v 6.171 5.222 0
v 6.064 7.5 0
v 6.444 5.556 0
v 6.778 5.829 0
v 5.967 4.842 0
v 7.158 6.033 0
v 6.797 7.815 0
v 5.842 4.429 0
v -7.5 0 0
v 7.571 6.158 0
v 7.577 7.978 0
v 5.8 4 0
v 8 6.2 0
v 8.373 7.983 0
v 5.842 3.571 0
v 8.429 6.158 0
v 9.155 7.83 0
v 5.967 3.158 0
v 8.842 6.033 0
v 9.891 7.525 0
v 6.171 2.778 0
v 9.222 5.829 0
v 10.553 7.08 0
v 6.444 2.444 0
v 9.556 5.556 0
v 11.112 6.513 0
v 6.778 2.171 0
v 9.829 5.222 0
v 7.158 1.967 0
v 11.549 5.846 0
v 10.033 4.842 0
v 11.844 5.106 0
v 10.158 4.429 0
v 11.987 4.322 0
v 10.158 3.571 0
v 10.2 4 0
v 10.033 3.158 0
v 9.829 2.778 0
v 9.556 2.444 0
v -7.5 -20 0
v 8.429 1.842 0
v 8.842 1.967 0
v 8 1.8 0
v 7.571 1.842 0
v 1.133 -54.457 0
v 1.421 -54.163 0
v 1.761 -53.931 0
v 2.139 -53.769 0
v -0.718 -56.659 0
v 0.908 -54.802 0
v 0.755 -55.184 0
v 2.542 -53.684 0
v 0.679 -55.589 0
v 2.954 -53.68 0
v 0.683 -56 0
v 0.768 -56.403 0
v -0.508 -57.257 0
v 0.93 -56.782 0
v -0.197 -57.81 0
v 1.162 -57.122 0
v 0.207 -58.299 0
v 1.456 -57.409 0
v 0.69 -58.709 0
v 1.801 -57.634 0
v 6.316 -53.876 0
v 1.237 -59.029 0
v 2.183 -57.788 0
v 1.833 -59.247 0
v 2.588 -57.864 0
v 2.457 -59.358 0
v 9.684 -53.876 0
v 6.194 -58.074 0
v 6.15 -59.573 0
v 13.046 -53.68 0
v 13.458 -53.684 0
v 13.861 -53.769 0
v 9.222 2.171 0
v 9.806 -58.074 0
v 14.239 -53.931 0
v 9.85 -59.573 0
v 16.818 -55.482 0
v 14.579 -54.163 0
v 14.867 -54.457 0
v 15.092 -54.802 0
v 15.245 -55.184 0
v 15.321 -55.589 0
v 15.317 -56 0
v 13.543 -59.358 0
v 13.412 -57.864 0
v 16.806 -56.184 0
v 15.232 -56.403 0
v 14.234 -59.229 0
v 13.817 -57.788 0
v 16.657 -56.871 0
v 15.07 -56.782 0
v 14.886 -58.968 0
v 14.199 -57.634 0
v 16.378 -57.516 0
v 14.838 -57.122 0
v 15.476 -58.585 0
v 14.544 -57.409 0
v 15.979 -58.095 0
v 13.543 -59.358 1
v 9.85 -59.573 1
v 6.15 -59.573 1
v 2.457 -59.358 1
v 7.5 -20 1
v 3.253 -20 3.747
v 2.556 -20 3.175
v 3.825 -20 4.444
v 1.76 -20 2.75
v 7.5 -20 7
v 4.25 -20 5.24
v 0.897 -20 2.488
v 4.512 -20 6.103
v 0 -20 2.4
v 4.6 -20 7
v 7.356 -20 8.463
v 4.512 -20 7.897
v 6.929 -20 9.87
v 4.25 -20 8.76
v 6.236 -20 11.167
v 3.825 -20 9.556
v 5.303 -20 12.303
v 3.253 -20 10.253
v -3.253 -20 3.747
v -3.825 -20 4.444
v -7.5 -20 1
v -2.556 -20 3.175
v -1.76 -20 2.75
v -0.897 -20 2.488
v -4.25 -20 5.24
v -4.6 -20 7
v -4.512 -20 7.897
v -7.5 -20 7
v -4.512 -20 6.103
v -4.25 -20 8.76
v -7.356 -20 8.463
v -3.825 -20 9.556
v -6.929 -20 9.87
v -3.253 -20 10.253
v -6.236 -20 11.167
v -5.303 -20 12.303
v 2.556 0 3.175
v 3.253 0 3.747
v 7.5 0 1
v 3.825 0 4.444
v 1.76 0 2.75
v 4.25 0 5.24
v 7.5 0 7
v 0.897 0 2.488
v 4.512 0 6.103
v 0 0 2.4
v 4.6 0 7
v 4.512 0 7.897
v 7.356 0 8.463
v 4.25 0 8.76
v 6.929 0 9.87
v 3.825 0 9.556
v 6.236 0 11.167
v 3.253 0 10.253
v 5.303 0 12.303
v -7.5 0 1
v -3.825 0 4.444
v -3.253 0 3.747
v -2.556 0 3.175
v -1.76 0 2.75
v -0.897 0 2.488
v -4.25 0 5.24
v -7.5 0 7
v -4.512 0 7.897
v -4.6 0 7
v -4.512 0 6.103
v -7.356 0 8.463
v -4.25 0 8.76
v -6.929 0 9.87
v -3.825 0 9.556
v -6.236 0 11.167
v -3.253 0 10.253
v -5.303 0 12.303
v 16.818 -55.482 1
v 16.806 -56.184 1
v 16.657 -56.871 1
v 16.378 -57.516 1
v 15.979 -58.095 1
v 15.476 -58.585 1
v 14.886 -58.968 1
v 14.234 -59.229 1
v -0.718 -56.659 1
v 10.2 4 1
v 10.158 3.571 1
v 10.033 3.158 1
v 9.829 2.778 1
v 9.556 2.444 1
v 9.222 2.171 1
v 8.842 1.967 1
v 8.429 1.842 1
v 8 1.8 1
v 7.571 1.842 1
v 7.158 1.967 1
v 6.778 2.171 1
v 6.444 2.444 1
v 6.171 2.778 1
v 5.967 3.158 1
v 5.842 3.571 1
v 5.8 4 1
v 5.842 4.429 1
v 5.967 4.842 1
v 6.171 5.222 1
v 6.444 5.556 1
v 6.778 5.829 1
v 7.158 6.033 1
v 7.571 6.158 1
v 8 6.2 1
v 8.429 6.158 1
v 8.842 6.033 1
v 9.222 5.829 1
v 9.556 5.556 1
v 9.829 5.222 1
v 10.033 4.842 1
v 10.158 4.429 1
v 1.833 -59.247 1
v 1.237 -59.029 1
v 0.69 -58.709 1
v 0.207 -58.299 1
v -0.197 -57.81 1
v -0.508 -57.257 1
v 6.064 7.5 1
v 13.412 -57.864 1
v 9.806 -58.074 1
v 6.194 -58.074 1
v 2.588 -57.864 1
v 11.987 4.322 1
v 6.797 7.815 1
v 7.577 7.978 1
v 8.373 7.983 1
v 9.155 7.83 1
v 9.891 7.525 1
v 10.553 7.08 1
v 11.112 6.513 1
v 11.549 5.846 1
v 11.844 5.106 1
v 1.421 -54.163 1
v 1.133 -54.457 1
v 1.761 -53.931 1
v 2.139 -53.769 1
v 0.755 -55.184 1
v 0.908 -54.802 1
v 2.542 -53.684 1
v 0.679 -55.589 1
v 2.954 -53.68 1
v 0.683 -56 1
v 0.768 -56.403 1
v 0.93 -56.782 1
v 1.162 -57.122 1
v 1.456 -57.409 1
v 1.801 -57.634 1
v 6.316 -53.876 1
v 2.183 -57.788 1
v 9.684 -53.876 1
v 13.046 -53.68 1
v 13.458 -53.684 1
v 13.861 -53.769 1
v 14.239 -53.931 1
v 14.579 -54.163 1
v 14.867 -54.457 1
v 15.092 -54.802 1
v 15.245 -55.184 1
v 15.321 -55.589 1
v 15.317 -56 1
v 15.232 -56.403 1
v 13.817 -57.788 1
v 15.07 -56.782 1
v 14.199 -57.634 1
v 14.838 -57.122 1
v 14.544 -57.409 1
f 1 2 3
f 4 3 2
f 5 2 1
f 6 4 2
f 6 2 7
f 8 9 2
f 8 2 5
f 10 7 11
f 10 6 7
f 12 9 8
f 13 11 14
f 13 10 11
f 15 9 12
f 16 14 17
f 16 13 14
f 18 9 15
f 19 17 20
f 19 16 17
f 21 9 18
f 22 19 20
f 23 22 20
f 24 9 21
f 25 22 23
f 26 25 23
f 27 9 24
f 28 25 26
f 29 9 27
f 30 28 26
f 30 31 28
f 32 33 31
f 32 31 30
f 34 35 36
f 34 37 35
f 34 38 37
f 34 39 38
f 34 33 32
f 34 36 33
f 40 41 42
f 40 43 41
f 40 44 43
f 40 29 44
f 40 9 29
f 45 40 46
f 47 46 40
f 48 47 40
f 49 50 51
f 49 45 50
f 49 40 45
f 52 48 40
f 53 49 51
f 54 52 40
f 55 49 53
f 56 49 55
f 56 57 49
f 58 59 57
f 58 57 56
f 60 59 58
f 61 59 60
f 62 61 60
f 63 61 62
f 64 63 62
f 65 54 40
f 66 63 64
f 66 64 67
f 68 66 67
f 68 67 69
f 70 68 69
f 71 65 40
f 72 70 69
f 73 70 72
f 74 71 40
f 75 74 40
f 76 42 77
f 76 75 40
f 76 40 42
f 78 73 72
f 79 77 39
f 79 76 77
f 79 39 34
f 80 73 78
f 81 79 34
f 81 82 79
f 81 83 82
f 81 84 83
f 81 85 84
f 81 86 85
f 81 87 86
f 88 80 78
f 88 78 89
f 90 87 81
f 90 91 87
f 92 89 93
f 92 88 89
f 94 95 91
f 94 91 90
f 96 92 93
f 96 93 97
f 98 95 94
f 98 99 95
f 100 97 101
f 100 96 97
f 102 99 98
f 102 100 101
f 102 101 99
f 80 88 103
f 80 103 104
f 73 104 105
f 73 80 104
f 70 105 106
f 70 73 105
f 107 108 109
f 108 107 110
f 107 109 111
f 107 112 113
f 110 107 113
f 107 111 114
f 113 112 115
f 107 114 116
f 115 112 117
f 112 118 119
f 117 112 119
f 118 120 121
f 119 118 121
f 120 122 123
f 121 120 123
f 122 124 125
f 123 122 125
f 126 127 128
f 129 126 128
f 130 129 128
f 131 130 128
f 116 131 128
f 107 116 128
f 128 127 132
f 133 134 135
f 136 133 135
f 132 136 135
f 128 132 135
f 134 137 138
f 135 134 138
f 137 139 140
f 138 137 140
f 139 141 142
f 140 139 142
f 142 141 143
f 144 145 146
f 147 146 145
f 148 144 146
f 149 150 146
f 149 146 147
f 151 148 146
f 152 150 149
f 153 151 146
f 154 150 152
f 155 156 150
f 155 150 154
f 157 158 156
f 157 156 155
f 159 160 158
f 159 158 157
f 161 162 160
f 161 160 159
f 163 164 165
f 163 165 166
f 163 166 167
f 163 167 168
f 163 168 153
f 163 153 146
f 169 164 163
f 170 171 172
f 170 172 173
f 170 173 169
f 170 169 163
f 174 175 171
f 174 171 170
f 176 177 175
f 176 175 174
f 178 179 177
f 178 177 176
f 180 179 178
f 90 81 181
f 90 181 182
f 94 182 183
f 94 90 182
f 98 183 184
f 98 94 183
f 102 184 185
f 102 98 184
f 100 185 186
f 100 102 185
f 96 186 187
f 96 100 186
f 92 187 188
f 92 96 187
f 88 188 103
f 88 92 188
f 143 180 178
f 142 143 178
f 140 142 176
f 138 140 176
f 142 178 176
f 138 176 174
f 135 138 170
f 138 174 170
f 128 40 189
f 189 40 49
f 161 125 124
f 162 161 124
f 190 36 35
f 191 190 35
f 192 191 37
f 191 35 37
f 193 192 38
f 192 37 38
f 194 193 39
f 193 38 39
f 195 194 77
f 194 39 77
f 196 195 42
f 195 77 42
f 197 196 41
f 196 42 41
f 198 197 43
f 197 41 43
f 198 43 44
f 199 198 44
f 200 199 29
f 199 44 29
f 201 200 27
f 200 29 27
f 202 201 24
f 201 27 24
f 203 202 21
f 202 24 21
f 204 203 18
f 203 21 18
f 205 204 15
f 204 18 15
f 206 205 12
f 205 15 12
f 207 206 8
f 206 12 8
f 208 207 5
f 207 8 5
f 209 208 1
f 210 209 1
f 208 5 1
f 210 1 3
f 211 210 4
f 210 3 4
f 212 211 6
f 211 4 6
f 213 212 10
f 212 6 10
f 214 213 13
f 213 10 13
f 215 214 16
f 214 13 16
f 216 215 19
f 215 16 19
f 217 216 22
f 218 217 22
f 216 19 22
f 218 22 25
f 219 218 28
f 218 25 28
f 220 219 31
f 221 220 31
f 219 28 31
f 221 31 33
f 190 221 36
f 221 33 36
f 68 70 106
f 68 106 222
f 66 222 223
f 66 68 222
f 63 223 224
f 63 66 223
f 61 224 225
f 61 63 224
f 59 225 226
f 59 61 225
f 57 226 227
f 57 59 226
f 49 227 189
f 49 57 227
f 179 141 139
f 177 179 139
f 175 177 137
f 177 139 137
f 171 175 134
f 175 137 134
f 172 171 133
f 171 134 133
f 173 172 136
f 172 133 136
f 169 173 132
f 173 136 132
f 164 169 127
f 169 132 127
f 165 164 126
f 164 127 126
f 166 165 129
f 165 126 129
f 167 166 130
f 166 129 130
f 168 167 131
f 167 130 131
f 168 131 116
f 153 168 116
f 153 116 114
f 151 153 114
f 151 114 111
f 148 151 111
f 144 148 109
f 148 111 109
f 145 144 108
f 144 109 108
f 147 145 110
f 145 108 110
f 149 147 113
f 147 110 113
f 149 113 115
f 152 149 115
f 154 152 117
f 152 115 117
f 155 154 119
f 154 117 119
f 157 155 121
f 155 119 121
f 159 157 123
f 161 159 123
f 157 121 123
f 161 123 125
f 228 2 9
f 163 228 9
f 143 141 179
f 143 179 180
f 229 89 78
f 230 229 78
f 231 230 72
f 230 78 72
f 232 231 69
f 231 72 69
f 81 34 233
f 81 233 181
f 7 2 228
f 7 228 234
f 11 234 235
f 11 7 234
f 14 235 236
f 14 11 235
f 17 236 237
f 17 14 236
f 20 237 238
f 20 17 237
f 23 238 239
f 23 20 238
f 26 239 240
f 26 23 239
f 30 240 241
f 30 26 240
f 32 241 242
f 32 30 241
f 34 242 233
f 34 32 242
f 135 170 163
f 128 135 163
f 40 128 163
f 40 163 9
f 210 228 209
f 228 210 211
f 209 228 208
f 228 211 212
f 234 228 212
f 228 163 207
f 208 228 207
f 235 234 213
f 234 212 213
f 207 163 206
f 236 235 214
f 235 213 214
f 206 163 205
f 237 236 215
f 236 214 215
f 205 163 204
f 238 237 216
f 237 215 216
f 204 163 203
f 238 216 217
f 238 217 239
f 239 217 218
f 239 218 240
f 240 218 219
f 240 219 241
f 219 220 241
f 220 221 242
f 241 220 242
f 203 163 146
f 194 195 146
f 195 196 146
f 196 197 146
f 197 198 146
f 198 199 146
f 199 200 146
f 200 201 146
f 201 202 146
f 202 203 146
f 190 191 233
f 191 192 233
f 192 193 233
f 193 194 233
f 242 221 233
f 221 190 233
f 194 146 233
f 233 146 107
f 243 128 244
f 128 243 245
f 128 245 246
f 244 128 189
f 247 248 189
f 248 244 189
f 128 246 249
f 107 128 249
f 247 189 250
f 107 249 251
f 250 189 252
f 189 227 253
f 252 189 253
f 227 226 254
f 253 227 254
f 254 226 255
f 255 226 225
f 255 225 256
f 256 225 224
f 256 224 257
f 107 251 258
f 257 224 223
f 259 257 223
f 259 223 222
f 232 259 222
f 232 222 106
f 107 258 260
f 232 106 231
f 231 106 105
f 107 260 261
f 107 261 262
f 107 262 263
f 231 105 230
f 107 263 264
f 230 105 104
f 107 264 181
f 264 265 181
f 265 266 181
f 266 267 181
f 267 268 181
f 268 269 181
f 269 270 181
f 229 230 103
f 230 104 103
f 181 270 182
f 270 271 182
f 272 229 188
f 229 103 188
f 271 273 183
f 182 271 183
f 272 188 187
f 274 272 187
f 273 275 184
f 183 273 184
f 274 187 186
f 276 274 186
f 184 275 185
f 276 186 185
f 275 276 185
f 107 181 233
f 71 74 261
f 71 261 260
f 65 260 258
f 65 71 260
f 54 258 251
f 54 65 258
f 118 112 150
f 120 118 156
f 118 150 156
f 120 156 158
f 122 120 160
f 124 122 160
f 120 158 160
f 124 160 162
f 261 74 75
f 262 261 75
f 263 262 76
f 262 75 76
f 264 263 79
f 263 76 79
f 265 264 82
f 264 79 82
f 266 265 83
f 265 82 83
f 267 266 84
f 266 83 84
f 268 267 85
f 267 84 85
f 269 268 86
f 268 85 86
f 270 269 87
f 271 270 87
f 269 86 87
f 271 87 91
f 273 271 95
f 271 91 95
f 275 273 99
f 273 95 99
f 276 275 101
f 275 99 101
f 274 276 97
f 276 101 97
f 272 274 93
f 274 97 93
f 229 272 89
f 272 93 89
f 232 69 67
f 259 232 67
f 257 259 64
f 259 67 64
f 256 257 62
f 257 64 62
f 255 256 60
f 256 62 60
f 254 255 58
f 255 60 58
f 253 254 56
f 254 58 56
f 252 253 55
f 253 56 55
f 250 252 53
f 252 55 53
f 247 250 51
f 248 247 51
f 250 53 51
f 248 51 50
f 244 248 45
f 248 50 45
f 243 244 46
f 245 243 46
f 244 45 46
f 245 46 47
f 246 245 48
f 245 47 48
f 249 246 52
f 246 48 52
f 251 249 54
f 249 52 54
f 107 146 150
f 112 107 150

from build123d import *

# Parameters (mm, degrees)
PAD_DEPTH    = 20
SKETCH001_R  = 2.2
PAD001_DEPTH = 1
PAD002_DEPTH = 20


with BuildPart() as part:
    # Sketch → Pad (new body)
    with BuildSketch(Plane.XZ):
        with BuildLine():
            Line((-7.5, 7.000023), (-7.5, 0))
            Line((-7.5, 0), (7.5, 0))
            Line((7.5, 0), (7.5, 7.000023))
            ThreePointArc((7.5, 7.000023), (6.929092, 9.870136), (5.303301, 12.303301))
            Line((4.242641, 11.242641), (5.303301, 12.303301))
            ThreePointArc((-4.242641, 11.242641), (0, 1), (4.242641, 11.242641))
            Line((-4.242641, 11.242641), (-5.303301, 12.303301))
            ThreePointArc((-5.303301, 12.303301), (-6.929092, 9.870137), (-7.5, 7.000023))
        make_face()
    extrude(amount=PAD_DEPTH)

    # Sketch001 → Pad001 (new body)
    with BuildSketch(Plane(origin=(0, 0, 0), x_dir=(1, 0, 0), z_dir=(0, 0, -1))):
        with BuildLine():
            ThreePointArc((13.543105, 59.357983), (8, 59.6), (2.456895, 59.357983))
            ThreePointArc((2.456895, 59.357983), (0.439153, 58.514691), (-0.718231, 56.65919))
            Line((-7.5, 20), (-0.718231, 56.65919))
            Line((-7.5, 0), (-7.5, 20))
            Line((6.06439, -7.500488), (-7.5, 0))
            ThreePointArc((6.06439, -7.500488), (9.891476, -7.524531), (11.987014, -4.32205))
            Line((11.987014, -4.32205), (16.817658, 55.481839))
            ThreePointArc((16.817658, 55.481839), (15.979375, 58.094898), (13.543105, 59.357983))
        make_face()
        with Locations((8, -4)):
            Circle(SKETCH001_R, mode=Mode.SUBTRACT)
        with BuildLine():
            ThreePointArc((13.046318, 53.679673), (8, 53.9), (2.953682, 53.679673))
            ThreePointArc((2.587628, 57.863691), (0.678647, 55.588655), (2.953682, 53.679673))
            ThreePointArc((13.412372, 57.863691), (8, 58.1), (2.587628, 57.863691))
            ThreePointArc((13.046318, 53.679673), (15.321353, 55.588655), (13.412372, 57.863691))
        make_face(mode=Mode.SUBTRACT)
    extrude(amount=-PAD001_DEPTH)

    # Sketch002 → Pad002 (new body)
    with BuildSketch(Plane.XZ.offset(20)):
        with BuildLine():
            ThreePointArc((-3.252691, 10.252691), (0, 2.4), (3.252691, 10.252691))
            Line((3.252691, 10.252691), (4.242641, 11.242641))
            ThreePointArc((-4.242641, 11.242641), (0, 1), (4.242641, 11.242641))
            Line((-3.252691, 10.252691), (-4.242641, 11.242641))
        make_face()
    extrude(amount=-PAD002_DEPTH)


solid = part.part
